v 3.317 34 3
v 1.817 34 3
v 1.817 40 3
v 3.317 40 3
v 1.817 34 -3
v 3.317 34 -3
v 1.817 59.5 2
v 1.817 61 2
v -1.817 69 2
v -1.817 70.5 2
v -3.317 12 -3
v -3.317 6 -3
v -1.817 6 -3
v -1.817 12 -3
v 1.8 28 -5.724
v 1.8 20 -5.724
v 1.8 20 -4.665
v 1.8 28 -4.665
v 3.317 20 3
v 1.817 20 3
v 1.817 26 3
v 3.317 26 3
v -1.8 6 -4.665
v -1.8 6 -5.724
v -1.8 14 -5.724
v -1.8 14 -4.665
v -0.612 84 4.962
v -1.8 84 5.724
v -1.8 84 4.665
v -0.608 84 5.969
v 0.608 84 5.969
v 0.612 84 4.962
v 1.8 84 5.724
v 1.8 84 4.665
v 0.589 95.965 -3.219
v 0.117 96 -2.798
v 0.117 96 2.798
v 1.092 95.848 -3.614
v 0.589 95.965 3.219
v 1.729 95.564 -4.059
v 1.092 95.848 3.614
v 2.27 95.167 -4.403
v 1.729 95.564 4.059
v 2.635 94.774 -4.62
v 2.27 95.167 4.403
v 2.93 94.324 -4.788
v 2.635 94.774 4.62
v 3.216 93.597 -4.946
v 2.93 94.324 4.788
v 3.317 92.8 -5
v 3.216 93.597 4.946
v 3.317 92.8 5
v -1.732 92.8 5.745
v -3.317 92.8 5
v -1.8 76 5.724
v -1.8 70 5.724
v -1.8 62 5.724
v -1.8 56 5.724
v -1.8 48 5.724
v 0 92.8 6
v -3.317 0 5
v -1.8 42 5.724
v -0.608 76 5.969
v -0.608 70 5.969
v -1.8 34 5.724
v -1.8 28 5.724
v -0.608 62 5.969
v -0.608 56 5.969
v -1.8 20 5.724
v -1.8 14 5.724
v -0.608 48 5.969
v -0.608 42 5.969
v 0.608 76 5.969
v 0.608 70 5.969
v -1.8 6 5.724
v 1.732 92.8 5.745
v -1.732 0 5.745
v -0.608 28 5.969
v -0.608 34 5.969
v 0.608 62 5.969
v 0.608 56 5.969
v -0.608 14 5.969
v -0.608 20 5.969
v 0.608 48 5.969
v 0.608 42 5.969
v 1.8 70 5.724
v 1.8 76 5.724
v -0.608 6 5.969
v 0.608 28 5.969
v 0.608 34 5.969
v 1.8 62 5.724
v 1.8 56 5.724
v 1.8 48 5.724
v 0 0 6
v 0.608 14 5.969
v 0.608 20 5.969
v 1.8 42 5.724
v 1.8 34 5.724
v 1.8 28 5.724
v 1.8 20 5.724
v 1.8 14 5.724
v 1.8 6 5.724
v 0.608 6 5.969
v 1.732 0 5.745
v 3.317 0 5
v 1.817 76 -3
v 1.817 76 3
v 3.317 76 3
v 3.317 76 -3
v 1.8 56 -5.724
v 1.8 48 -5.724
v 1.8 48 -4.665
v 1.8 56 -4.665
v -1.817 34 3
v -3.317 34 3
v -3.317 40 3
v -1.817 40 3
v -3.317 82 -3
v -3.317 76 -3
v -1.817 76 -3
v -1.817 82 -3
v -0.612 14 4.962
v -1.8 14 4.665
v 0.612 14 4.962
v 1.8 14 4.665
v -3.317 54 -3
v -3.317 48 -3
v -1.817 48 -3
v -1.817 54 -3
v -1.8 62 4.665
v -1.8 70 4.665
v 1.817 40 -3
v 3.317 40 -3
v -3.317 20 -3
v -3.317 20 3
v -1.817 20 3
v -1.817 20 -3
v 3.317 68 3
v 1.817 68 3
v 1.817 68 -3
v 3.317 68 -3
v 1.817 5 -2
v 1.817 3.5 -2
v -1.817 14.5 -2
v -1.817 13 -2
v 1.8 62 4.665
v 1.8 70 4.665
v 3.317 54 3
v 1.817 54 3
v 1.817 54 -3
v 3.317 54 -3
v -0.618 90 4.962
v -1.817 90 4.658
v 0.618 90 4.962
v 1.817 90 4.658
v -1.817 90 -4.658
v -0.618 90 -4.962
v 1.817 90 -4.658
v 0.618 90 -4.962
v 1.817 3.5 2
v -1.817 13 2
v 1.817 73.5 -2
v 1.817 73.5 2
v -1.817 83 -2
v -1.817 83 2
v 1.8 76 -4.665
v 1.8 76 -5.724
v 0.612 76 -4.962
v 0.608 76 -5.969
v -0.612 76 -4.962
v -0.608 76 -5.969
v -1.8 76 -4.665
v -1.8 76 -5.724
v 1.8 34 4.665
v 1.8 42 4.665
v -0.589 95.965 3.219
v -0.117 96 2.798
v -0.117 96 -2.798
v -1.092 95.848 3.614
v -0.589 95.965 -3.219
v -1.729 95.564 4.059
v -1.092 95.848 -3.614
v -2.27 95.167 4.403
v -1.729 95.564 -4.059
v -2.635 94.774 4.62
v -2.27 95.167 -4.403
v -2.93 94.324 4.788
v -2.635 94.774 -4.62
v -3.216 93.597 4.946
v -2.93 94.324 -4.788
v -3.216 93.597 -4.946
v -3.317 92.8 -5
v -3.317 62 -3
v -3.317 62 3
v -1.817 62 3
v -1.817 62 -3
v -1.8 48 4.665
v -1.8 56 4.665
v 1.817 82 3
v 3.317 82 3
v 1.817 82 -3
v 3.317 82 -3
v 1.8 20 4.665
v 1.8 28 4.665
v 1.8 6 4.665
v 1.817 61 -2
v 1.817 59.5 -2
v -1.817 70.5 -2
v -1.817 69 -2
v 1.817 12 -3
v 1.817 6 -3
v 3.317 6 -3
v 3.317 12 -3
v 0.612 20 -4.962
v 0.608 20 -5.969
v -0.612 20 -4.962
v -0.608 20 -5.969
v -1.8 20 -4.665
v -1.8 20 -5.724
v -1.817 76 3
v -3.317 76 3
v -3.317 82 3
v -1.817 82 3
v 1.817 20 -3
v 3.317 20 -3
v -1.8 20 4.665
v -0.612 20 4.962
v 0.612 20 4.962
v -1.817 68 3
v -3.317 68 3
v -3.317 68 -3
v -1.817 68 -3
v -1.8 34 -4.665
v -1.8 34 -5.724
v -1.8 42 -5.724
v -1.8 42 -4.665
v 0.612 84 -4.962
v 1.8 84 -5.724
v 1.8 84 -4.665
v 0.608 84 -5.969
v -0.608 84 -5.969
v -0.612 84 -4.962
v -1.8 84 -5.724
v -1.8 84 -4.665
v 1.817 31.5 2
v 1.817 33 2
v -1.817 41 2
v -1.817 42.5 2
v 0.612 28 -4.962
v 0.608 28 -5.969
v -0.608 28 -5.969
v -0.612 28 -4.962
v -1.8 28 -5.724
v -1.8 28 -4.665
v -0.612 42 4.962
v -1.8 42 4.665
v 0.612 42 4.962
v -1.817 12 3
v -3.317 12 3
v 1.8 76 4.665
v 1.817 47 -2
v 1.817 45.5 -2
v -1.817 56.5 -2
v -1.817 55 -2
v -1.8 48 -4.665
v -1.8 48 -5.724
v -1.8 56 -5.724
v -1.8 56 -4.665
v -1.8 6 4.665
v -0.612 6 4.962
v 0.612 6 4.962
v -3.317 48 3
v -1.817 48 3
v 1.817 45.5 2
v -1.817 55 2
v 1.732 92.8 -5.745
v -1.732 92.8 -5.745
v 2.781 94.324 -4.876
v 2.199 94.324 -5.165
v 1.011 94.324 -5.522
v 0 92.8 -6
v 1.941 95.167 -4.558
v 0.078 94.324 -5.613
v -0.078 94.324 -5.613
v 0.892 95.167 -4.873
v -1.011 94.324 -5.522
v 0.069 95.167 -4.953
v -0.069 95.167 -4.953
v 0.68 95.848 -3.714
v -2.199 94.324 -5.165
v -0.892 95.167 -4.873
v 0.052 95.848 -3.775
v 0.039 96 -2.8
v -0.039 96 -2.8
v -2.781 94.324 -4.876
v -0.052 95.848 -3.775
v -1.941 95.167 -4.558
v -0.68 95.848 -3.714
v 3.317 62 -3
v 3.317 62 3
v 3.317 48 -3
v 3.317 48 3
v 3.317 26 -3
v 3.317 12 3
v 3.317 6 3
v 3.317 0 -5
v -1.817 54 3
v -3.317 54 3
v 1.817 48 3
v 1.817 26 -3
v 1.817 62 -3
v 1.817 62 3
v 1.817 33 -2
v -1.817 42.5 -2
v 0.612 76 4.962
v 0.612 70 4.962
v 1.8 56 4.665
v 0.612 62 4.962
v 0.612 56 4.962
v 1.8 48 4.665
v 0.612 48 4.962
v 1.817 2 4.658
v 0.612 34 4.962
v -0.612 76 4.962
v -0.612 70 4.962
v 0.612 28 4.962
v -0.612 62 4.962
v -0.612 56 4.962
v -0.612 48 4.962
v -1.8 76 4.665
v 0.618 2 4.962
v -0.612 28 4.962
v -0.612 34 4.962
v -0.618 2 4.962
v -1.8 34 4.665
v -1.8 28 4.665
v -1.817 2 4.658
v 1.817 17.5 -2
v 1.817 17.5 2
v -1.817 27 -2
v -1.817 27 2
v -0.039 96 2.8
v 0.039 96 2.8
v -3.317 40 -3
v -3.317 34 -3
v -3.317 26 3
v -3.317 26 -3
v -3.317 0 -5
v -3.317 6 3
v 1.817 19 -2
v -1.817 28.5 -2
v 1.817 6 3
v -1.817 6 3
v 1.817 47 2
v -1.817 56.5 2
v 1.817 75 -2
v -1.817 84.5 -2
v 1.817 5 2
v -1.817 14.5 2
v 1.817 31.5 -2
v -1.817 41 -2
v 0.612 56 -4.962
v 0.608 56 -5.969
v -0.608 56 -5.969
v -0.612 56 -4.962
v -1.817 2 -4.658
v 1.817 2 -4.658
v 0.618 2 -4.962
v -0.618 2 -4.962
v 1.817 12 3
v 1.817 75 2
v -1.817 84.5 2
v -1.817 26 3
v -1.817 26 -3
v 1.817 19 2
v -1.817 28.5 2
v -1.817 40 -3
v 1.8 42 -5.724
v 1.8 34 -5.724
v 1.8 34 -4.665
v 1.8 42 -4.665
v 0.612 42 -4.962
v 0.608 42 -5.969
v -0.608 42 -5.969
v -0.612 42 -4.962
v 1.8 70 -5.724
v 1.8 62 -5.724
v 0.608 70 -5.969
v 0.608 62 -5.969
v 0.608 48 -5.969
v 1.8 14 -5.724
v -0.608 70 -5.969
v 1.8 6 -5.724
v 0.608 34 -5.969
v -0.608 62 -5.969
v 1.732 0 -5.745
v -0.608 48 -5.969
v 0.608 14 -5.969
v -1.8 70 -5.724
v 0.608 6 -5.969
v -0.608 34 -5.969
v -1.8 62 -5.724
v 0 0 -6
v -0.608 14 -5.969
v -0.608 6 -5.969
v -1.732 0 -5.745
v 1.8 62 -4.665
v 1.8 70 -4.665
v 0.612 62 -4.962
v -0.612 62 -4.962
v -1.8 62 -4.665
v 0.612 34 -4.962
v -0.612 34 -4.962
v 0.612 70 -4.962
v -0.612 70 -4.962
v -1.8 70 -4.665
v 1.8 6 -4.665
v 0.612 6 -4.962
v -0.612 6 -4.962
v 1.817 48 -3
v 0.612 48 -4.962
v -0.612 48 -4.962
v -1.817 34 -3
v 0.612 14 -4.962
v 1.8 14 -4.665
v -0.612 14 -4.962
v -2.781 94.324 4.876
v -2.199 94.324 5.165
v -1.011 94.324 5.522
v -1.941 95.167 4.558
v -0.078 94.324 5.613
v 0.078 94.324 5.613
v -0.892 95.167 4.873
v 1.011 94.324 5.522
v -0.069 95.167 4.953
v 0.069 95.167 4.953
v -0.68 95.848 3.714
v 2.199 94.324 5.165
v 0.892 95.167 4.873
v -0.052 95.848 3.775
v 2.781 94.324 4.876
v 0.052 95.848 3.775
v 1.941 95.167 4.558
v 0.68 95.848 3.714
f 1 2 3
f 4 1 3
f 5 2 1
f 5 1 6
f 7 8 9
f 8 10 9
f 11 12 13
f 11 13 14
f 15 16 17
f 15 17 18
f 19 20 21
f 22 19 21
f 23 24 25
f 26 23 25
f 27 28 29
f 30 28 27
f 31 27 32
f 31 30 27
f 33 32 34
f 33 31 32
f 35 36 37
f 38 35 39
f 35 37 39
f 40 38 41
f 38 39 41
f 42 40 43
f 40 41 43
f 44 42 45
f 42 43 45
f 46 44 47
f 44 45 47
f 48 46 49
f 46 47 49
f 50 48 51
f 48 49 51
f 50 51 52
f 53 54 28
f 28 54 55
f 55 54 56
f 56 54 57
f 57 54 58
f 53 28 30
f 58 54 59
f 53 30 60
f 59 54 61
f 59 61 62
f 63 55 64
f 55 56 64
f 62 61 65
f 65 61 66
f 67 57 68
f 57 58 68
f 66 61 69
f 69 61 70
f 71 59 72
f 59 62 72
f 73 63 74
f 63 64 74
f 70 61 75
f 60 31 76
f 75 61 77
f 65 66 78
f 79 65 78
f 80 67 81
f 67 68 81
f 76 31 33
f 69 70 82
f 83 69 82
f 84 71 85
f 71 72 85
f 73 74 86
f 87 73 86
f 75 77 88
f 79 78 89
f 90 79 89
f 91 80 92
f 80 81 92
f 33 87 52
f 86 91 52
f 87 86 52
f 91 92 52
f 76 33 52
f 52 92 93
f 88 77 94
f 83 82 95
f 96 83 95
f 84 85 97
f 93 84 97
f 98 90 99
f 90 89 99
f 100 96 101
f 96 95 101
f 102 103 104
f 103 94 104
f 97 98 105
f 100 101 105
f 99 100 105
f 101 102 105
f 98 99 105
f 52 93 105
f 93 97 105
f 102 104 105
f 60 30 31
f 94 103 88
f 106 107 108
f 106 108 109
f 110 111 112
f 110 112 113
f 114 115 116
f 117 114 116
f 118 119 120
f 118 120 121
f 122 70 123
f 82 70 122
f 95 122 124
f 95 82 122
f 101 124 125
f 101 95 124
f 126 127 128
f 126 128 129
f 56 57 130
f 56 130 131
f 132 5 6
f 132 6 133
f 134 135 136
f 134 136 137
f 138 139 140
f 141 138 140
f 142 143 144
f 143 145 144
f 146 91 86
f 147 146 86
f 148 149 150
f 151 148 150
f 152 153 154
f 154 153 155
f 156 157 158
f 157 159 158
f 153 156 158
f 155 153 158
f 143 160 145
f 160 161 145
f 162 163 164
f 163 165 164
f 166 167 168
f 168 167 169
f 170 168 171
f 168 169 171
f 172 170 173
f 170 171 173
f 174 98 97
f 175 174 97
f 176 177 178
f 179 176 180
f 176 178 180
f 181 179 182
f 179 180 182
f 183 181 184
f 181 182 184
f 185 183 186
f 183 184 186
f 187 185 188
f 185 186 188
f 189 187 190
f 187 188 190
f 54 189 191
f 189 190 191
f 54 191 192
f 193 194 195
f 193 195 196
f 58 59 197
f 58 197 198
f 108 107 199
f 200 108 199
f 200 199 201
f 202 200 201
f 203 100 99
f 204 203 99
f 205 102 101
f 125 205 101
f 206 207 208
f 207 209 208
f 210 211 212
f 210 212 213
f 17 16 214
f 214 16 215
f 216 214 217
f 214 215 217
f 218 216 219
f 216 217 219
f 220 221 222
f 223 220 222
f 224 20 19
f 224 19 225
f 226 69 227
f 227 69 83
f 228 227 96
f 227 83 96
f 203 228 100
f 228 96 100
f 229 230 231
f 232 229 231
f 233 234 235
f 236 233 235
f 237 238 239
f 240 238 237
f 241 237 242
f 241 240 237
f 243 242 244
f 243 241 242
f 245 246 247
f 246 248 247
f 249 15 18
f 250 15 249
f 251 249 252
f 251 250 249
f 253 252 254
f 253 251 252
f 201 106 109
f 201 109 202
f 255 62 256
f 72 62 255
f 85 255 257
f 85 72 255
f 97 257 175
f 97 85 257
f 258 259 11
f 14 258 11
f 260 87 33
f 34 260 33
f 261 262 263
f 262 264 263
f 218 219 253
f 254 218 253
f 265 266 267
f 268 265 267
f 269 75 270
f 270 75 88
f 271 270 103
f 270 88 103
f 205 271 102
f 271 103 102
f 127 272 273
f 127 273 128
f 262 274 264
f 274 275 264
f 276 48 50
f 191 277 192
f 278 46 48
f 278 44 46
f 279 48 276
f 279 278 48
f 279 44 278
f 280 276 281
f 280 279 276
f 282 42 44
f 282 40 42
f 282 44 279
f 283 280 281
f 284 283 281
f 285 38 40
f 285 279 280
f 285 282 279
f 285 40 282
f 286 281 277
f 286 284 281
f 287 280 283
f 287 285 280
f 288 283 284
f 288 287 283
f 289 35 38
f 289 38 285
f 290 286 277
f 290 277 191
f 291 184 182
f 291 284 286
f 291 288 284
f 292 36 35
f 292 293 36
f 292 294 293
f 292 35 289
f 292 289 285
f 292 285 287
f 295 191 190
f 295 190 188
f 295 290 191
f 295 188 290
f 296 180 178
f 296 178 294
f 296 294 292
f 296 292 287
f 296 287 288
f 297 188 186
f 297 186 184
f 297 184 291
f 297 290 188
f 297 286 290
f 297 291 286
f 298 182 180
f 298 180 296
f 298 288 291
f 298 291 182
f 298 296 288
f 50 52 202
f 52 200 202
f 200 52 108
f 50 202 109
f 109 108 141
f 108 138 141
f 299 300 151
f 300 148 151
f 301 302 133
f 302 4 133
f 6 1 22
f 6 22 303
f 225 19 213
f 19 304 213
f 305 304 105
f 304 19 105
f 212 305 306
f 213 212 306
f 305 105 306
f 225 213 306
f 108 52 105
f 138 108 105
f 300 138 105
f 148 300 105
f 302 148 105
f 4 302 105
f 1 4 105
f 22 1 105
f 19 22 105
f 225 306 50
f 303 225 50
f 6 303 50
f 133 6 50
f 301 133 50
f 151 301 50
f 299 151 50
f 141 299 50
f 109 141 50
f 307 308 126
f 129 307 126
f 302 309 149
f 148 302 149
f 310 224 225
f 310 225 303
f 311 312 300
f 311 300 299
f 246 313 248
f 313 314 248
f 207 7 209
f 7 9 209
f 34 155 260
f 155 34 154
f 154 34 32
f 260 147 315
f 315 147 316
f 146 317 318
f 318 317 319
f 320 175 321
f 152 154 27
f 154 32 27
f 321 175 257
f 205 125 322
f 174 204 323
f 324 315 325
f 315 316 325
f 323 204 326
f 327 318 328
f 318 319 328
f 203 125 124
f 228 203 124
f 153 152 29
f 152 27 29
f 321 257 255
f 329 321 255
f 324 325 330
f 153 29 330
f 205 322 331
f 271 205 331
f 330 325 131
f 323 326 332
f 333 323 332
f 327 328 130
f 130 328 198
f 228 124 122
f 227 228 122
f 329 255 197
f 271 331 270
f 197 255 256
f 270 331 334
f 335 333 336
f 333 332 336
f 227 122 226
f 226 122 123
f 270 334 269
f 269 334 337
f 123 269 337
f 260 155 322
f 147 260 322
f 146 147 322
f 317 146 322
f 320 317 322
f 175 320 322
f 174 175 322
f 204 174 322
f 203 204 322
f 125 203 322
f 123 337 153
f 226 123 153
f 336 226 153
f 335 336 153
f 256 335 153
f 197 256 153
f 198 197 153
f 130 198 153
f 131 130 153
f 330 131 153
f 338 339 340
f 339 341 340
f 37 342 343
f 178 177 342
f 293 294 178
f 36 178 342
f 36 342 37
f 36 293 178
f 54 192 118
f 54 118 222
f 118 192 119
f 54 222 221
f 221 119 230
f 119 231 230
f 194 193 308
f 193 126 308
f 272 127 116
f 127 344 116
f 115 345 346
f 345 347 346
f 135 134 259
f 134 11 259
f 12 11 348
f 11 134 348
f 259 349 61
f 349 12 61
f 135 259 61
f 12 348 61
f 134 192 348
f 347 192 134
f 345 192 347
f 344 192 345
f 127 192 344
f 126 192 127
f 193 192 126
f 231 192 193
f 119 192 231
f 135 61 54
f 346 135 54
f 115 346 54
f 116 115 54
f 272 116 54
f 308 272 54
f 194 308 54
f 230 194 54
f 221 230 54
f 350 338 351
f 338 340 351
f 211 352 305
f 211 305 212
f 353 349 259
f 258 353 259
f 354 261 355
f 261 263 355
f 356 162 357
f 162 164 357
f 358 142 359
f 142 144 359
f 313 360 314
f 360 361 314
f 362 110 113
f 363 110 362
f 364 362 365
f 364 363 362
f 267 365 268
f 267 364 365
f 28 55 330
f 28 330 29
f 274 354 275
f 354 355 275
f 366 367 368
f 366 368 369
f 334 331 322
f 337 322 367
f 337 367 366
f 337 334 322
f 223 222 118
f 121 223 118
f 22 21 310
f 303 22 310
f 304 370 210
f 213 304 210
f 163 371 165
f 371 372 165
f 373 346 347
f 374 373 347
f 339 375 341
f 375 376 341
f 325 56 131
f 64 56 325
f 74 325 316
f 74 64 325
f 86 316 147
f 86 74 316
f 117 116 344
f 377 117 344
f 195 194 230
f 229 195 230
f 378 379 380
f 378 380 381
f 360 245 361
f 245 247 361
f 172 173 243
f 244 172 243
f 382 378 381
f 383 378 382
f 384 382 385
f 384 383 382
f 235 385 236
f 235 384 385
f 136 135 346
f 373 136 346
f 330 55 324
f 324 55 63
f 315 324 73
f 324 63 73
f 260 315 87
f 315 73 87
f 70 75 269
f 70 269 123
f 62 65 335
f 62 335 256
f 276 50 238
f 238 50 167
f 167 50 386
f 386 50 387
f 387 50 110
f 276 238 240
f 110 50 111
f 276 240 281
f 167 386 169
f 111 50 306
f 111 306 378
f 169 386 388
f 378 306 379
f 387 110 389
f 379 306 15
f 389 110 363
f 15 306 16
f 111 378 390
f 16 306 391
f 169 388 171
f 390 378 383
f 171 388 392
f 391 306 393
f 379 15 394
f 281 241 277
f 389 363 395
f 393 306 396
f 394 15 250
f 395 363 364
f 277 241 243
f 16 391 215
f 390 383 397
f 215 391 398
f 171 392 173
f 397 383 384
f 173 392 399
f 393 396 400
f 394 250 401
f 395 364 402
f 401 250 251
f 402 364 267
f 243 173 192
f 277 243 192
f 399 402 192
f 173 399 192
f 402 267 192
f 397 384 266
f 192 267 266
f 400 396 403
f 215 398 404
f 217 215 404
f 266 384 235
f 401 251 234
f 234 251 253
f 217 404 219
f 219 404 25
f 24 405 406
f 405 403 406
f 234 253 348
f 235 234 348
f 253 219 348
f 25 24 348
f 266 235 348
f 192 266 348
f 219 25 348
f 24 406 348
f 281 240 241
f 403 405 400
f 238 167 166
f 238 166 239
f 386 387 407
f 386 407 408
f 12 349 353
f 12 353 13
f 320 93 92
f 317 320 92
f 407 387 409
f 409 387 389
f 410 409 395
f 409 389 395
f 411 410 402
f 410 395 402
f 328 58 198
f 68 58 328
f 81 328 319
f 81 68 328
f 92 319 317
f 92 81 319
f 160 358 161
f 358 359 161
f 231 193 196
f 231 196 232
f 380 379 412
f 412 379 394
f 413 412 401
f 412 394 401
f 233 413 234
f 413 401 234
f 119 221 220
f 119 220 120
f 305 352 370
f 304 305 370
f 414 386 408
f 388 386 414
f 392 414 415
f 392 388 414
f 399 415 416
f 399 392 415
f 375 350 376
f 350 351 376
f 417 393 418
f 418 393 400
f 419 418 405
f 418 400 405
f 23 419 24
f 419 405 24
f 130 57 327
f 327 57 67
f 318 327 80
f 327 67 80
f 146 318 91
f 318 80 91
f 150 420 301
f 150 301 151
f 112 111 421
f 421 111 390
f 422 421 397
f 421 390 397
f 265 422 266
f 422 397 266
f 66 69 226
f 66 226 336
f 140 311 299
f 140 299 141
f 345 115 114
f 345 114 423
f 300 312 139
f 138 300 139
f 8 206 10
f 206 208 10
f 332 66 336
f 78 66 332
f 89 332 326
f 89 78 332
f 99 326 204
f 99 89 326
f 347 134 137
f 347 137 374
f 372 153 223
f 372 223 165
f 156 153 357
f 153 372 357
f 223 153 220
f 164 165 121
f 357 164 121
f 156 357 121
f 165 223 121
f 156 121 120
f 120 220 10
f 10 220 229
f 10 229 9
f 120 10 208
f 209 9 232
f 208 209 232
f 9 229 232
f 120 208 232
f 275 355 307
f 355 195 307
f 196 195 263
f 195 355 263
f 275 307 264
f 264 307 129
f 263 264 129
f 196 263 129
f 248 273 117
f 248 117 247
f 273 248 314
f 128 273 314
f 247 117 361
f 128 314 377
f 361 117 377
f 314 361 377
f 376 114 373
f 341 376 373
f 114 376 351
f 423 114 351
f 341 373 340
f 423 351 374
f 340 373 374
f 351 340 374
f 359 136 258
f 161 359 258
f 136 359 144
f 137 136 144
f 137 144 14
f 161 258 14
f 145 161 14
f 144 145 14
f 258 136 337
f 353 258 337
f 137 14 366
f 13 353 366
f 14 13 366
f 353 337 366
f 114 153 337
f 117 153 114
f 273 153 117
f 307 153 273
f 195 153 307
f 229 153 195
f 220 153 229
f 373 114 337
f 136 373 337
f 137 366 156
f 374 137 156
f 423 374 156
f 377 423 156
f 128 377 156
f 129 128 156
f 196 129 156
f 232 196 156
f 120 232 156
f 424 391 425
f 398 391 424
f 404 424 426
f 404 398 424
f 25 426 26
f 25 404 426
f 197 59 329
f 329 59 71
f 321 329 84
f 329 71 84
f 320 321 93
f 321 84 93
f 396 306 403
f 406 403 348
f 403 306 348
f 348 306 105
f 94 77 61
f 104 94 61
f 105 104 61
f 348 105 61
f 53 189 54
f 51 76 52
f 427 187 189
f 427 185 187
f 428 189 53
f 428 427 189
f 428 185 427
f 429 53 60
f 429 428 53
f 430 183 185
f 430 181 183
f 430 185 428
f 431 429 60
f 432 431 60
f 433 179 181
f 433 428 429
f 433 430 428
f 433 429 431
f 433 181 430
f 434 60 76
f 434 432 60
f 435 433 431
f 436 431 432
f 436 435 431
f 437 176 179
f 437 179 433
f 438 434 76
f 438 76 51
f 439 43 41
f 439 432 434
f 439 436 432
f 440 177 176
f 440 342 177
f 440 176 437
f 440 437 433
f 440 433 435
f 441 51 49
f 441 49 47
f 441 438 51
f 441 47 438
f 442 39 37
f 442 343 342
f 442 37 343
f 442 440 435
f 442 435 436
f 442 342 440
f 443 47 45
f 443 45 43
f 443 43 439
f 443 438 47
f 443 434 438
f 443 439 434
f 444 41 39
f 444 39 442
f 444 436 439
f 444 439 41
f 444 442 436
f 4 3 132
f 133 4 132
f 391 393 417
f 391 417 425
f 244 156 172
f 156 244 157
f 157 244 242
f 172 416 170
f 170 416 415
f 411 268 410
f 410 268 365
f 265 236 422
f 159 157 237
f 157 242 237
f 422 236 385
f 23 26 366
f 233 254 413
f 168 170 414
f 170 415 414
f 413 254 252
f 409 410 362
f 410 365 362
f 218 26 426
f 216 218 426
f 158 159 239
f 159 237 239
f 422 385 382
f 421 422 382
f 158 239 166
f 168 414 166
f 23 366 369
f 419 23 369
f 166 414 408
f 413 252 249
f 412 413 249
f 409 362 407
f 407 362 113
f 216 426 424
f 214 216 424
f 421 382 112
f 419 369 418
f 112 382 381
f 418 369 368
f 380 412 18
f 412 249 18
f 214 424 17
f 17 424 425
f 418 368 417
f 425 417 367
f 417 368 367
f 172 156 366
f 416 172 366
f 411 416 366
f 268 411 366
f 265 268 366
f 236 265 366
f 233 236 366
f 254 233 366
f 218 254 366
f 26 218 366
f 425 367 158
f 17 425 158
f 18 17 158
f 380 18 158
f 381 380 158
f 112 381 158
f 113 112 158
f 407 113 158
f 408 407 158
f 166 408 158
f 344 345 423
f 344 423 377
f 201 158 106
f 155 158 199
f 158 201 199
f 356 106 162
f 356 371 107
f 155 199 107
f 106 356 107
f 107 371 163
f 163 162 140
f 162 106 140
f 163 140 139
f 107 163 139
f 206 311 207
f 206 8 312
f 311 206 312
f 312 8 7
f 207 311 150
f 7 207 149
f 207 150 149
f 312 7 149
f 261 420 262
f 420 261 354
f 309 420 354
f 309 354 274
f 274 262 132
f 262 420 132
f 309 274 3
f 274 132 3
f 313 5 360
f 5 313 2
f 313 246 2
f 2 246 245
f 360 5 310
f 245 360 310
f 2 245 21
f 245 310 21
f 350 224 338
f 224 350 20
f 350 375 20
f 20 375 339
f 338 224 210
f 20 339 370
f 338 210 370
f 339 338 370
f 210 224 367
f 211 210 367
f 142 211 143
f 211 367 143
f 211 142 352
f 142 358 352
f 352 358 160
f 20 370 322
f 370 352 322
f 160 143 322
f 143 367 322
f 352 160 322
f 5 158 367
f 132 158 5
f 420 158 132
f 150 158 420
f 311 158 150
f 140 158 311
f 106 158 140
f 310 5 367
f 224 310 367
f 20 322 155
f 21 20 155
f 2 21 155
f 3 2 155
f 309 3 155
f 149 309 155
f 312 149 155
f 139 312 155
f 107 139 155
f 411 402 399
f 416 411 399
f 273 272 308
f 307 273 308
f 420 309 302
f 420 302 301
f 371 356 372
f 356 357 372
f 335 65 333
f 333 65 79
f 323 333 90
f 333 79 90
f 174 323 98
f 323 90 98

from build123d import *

# Parameters (mm, degrees)
BOSS_EXTRUDE1_DEPTH = 90
WRAP1_START         = -6.633249581
WRAP1_OUTLINE_W     = 6
WRAP1_OUTLINE_H     = 6
WRAP1_DEPTH         = 6.633249581
SKETCH4_W           = 3.6
SKETCH4_H           = 8
CUT_EXTRUDE1_DEPTH  = 5
CIRPATTERN3_COUNT   = 2
BOSS_EXTRUDE2_DEPTH = 2
LPATTERN1_COUNT     = 6
LPATTERN1_PITCH     = 14
BOSS_EXTRUDE3_DEPTH = 6
FILLET4_R           = 3.2


# Read off the part's stored shape, not the designer's step: Wrap1
with BuildPart() as part:
    # Sketch1 → Boss-Extrude1 (new body)
    with BuildSketch(Plane(origin=(0, 0, 0), x_dir=(1, 0, 0), z_dir=(0, 1, 0))):
        with BuildLine():
            Line((-3.31662479, 5), (-3.31662479, -5))
            ThreePointArc((-3.31662479, -5), (0, -6), (3.31662479, -5))
            Line((3.31662479, -5), (3.31662479, 5))
            ThreePointArc((3.31662479, 5), (0, 6), (-3.31662479, 5))
        make_face()
        with BuildLine():
            Line((-1.81662479, -4.658312395), (-1.81662479, 4.658312395))
            ThreePointArc((-1.81662479, 4.658312395), (0, 5), (1.81662479, 4.658312395))
            Line((1.81662479, 4.658312395), (1.81662479, -4.658312395))
            ThreePointArc((1.81662479, -4.658312395), (0, -5), (-1.81662479, -4.658312395))
        make_face(mode=Mode.SUBTRACT)
    extrude(amount=BOSS_EXTRUDE1_DEPTH)

    # Wrap1 outline → Wrap1 (cut)
    with BuildSketch(Plane(origin=(3.31662479, 0, 0), x_dir=(0, 0, -1), z_dir=(1, 0, 0)).offset(WRAP1_START)):
        with Locations((0, 79)):
            Rectangle(WRAP1_OUTLINE_W, WRAP1_OUTLINE_H)
        with Locations((0, 65)):
            Rectangle(WRAP1_OUTLINE_W, WRAP1_OUTLINE_H)
        with Locations((0, 51)):
            Rectangle(WRAP1_OUTLINE_W, WRAP1_OUTLINE_H)
        with Locations((0, 37)):
            Rectangle(WRAP1_OUTLINE_W, WRAP1_OUTLINE_H)
        with Locations((0, 23)):
            Rectangle(WRAP1_OUTLINE_W, WRAP1_OUTLINE_H)
        with Locations((0, 9)):
            Rectangle(WRAP1_OUTLINE_W, WRAP1_OUTLINE_H)
    extrude(amount=WRAP1_DEPTH, mode=Mode.SUBTRACT)

    # Sketch4 → Cut-Extrude1 (cut)
    with BuildSketch(Plane.XY.offset(6)):
        with Locations((0, 10)):
            Rectangle(SKETCH4_W, SKETCH4_H)
        with Locations((0, 24)):
            Rectangle(SKETCH4_W, SKETCH4_H)
        with Locations((0, 38)):
            Rectangle(SKETCH4_W, SKETCH4_H)
        with Locations((0, 52)):
            Rectangle(SKETCH4_W, SKETCH4_H)
        with Locations((0, 66)):
            Rectangle(SKETCH4_W, SKETCH4_H)
        with Locations((0, 80)):
            Rectangle(SKETCH4_W, SKETCH4_H)
    cut_extrude1 = extrude(amount=-CUT_EXTRUDE1_DEPTH, mode=Mode.SUBTRACT)

    # CirPattern3: Cut-Extrude1 ×2 about axis
    cirpattern3_axis = Axis((0, 90, 0), (0, -1, 0))
    for i in range(1, CIRPATTERN3_COUNT):
        add(cut_extrude1.rotate(cirpattern3_axis, i * 360 / CIRPATTERN3_COUNT), mode=Mode.SUBTRACT)

    # Sketch5 → Boss-Extrude2 (add)
    with BuildSketch(Plane.XZ):
        with BuildLine():
            Line((1.81662479, 4.658312395), (1.81662479, -4.658312395))
            ThreePointArc((1.81662479, -4.658312395), (0, -5), (-1.81662479, -4.658312395))
            Line((-1.81662479, -4.658312395), (-1.81662479, 4.658312395))
            ThreePointArc((-1.81662479, 4.658312395), (0, 5), (1.81662479, 4.658312395))
        make_face()
    extrude(amount=-BOSS_EXTRUDE2_DEPTH)

    # Sketch8 → Loft1 section 0
    with BuildSketch(Plane.ZY.offset(-1.81662479)):
        with BuildLine():
            Line((-2, 75), (2, 75))
            Line((2, 75), (2, 73.5))
            Line((2, 73.5), (-2, 73.5))
            Line((-2, 73.5), (-2, 75))
        make_face()
    # Sketch6 → Loft1 section 1
    with BuildSketch(Plane(origin=(-1.81662479, 0, 0), x_dir=(0, 0, -1), z_dir=(1, 0, 0))):
        with BuildLine():
            Line((-2, 84.5), (2, 84.5))
            Line((2, 84.5), (2, 83))
            Line((2, 83), (-2, 83))
            Line((-2, 83), (-2, 84.5))
        make_face()
    loft1 = loft()

    # LPattern1: Loft1 ×6
    with Locations(*[(0, -i * LPATTERN1_PITCH, 0) for i in range(1, LPATTERN1_COUNT)]):
        add(loft1)

    # Sketch10 → Boss-Extrude3 (add)
    with BuildSketch(Plane(origin=(0, 90, 0), x_dir=(1, 0, 0), z_dir=(0, 1, 0))):
        with BuildLine():
            Line((-3.31662479, 5), (-3.31662479, -5))
            ThreePointArc((-3.31662479, -5), (0, -6), (3.31662479, -5))
            Line((3.31662479, -5), (3.31662479, 5))
            ThreePointArc((3.31662479, 5), (0, 6), (-3.31662479, 5))
        make_face()
    extrude(amount=BOSS_EXTRUDE3_DEPTH)

    # Fillet4
    # the kernel refuses this fillet: 3.2 mm, written as the material it takes off along each edge
    with BuildSketch(Plane(origin=(0, 96, 0), x_dir=(0.9398790484692316, 0, 0.34150750247772244), z_dir=(-0.34150750247772244, 0, 0.9398790484692316))) as fillet4_piece_1:
        with BuildLine():
            CenterArc((6 - FILLET4_R, -FILLET4_R), FILLET4_R, 0, 90)
            Line((6, -FILLET4_R), (6, 0))
            Line((6, 0), (6 - FILLET4_R, 0))
        make_face()
    revolve(axis=Axis((0, 96, 0), (0, 1, 0)), revolution_arc=219.937491809, mode=Mode.SUBTRACT)
    with BuildSketch(Plane(origin=(-3.31662479, 96, -13), x_dir=(0, -1, 0), z_dir=(0, 0, 1)), Plane(origin=(3.31662479, 96, 13), x_dir=(0, -1, 0), z_dir=(0, 0, -1))) as fillet4_piece_2:
        with BuildLine():
            CenterArc((FILLET4_R, FILLET4_R), FILLET4_R, 180, 90)
            Line((0, FILLET4_R), (0, 0))
            Line((0, 0), (FILLET4_R, 0))
        make_face()
    extrude(amount=26, mode=Mode.SUBTRACT)
    with BuildSketch(Plane(origin=(0, 96, 0), x_dir=(-0.9398790484692316, 0, -0.34150750247772244), z_dir=(0.34150750247772244, 0, -0.9398790484692316))) as fillet4_piece_3:
        with BuildLine():
            CenterArc((6 - FILLET4_R, -FILLET4_R), FILLET4_R, 0, 90)
            Line((6 - FILLET4_R, 0), (6, 0))
            Line((6, 0), (6, -FILLET4_R))
        make_face()
    revolve(axis=Axis((0, 96, 0), (0, 1, 0)), revolution_arc=219.937491809, mode=Mode.SUBTRACT)


solid = part.part
